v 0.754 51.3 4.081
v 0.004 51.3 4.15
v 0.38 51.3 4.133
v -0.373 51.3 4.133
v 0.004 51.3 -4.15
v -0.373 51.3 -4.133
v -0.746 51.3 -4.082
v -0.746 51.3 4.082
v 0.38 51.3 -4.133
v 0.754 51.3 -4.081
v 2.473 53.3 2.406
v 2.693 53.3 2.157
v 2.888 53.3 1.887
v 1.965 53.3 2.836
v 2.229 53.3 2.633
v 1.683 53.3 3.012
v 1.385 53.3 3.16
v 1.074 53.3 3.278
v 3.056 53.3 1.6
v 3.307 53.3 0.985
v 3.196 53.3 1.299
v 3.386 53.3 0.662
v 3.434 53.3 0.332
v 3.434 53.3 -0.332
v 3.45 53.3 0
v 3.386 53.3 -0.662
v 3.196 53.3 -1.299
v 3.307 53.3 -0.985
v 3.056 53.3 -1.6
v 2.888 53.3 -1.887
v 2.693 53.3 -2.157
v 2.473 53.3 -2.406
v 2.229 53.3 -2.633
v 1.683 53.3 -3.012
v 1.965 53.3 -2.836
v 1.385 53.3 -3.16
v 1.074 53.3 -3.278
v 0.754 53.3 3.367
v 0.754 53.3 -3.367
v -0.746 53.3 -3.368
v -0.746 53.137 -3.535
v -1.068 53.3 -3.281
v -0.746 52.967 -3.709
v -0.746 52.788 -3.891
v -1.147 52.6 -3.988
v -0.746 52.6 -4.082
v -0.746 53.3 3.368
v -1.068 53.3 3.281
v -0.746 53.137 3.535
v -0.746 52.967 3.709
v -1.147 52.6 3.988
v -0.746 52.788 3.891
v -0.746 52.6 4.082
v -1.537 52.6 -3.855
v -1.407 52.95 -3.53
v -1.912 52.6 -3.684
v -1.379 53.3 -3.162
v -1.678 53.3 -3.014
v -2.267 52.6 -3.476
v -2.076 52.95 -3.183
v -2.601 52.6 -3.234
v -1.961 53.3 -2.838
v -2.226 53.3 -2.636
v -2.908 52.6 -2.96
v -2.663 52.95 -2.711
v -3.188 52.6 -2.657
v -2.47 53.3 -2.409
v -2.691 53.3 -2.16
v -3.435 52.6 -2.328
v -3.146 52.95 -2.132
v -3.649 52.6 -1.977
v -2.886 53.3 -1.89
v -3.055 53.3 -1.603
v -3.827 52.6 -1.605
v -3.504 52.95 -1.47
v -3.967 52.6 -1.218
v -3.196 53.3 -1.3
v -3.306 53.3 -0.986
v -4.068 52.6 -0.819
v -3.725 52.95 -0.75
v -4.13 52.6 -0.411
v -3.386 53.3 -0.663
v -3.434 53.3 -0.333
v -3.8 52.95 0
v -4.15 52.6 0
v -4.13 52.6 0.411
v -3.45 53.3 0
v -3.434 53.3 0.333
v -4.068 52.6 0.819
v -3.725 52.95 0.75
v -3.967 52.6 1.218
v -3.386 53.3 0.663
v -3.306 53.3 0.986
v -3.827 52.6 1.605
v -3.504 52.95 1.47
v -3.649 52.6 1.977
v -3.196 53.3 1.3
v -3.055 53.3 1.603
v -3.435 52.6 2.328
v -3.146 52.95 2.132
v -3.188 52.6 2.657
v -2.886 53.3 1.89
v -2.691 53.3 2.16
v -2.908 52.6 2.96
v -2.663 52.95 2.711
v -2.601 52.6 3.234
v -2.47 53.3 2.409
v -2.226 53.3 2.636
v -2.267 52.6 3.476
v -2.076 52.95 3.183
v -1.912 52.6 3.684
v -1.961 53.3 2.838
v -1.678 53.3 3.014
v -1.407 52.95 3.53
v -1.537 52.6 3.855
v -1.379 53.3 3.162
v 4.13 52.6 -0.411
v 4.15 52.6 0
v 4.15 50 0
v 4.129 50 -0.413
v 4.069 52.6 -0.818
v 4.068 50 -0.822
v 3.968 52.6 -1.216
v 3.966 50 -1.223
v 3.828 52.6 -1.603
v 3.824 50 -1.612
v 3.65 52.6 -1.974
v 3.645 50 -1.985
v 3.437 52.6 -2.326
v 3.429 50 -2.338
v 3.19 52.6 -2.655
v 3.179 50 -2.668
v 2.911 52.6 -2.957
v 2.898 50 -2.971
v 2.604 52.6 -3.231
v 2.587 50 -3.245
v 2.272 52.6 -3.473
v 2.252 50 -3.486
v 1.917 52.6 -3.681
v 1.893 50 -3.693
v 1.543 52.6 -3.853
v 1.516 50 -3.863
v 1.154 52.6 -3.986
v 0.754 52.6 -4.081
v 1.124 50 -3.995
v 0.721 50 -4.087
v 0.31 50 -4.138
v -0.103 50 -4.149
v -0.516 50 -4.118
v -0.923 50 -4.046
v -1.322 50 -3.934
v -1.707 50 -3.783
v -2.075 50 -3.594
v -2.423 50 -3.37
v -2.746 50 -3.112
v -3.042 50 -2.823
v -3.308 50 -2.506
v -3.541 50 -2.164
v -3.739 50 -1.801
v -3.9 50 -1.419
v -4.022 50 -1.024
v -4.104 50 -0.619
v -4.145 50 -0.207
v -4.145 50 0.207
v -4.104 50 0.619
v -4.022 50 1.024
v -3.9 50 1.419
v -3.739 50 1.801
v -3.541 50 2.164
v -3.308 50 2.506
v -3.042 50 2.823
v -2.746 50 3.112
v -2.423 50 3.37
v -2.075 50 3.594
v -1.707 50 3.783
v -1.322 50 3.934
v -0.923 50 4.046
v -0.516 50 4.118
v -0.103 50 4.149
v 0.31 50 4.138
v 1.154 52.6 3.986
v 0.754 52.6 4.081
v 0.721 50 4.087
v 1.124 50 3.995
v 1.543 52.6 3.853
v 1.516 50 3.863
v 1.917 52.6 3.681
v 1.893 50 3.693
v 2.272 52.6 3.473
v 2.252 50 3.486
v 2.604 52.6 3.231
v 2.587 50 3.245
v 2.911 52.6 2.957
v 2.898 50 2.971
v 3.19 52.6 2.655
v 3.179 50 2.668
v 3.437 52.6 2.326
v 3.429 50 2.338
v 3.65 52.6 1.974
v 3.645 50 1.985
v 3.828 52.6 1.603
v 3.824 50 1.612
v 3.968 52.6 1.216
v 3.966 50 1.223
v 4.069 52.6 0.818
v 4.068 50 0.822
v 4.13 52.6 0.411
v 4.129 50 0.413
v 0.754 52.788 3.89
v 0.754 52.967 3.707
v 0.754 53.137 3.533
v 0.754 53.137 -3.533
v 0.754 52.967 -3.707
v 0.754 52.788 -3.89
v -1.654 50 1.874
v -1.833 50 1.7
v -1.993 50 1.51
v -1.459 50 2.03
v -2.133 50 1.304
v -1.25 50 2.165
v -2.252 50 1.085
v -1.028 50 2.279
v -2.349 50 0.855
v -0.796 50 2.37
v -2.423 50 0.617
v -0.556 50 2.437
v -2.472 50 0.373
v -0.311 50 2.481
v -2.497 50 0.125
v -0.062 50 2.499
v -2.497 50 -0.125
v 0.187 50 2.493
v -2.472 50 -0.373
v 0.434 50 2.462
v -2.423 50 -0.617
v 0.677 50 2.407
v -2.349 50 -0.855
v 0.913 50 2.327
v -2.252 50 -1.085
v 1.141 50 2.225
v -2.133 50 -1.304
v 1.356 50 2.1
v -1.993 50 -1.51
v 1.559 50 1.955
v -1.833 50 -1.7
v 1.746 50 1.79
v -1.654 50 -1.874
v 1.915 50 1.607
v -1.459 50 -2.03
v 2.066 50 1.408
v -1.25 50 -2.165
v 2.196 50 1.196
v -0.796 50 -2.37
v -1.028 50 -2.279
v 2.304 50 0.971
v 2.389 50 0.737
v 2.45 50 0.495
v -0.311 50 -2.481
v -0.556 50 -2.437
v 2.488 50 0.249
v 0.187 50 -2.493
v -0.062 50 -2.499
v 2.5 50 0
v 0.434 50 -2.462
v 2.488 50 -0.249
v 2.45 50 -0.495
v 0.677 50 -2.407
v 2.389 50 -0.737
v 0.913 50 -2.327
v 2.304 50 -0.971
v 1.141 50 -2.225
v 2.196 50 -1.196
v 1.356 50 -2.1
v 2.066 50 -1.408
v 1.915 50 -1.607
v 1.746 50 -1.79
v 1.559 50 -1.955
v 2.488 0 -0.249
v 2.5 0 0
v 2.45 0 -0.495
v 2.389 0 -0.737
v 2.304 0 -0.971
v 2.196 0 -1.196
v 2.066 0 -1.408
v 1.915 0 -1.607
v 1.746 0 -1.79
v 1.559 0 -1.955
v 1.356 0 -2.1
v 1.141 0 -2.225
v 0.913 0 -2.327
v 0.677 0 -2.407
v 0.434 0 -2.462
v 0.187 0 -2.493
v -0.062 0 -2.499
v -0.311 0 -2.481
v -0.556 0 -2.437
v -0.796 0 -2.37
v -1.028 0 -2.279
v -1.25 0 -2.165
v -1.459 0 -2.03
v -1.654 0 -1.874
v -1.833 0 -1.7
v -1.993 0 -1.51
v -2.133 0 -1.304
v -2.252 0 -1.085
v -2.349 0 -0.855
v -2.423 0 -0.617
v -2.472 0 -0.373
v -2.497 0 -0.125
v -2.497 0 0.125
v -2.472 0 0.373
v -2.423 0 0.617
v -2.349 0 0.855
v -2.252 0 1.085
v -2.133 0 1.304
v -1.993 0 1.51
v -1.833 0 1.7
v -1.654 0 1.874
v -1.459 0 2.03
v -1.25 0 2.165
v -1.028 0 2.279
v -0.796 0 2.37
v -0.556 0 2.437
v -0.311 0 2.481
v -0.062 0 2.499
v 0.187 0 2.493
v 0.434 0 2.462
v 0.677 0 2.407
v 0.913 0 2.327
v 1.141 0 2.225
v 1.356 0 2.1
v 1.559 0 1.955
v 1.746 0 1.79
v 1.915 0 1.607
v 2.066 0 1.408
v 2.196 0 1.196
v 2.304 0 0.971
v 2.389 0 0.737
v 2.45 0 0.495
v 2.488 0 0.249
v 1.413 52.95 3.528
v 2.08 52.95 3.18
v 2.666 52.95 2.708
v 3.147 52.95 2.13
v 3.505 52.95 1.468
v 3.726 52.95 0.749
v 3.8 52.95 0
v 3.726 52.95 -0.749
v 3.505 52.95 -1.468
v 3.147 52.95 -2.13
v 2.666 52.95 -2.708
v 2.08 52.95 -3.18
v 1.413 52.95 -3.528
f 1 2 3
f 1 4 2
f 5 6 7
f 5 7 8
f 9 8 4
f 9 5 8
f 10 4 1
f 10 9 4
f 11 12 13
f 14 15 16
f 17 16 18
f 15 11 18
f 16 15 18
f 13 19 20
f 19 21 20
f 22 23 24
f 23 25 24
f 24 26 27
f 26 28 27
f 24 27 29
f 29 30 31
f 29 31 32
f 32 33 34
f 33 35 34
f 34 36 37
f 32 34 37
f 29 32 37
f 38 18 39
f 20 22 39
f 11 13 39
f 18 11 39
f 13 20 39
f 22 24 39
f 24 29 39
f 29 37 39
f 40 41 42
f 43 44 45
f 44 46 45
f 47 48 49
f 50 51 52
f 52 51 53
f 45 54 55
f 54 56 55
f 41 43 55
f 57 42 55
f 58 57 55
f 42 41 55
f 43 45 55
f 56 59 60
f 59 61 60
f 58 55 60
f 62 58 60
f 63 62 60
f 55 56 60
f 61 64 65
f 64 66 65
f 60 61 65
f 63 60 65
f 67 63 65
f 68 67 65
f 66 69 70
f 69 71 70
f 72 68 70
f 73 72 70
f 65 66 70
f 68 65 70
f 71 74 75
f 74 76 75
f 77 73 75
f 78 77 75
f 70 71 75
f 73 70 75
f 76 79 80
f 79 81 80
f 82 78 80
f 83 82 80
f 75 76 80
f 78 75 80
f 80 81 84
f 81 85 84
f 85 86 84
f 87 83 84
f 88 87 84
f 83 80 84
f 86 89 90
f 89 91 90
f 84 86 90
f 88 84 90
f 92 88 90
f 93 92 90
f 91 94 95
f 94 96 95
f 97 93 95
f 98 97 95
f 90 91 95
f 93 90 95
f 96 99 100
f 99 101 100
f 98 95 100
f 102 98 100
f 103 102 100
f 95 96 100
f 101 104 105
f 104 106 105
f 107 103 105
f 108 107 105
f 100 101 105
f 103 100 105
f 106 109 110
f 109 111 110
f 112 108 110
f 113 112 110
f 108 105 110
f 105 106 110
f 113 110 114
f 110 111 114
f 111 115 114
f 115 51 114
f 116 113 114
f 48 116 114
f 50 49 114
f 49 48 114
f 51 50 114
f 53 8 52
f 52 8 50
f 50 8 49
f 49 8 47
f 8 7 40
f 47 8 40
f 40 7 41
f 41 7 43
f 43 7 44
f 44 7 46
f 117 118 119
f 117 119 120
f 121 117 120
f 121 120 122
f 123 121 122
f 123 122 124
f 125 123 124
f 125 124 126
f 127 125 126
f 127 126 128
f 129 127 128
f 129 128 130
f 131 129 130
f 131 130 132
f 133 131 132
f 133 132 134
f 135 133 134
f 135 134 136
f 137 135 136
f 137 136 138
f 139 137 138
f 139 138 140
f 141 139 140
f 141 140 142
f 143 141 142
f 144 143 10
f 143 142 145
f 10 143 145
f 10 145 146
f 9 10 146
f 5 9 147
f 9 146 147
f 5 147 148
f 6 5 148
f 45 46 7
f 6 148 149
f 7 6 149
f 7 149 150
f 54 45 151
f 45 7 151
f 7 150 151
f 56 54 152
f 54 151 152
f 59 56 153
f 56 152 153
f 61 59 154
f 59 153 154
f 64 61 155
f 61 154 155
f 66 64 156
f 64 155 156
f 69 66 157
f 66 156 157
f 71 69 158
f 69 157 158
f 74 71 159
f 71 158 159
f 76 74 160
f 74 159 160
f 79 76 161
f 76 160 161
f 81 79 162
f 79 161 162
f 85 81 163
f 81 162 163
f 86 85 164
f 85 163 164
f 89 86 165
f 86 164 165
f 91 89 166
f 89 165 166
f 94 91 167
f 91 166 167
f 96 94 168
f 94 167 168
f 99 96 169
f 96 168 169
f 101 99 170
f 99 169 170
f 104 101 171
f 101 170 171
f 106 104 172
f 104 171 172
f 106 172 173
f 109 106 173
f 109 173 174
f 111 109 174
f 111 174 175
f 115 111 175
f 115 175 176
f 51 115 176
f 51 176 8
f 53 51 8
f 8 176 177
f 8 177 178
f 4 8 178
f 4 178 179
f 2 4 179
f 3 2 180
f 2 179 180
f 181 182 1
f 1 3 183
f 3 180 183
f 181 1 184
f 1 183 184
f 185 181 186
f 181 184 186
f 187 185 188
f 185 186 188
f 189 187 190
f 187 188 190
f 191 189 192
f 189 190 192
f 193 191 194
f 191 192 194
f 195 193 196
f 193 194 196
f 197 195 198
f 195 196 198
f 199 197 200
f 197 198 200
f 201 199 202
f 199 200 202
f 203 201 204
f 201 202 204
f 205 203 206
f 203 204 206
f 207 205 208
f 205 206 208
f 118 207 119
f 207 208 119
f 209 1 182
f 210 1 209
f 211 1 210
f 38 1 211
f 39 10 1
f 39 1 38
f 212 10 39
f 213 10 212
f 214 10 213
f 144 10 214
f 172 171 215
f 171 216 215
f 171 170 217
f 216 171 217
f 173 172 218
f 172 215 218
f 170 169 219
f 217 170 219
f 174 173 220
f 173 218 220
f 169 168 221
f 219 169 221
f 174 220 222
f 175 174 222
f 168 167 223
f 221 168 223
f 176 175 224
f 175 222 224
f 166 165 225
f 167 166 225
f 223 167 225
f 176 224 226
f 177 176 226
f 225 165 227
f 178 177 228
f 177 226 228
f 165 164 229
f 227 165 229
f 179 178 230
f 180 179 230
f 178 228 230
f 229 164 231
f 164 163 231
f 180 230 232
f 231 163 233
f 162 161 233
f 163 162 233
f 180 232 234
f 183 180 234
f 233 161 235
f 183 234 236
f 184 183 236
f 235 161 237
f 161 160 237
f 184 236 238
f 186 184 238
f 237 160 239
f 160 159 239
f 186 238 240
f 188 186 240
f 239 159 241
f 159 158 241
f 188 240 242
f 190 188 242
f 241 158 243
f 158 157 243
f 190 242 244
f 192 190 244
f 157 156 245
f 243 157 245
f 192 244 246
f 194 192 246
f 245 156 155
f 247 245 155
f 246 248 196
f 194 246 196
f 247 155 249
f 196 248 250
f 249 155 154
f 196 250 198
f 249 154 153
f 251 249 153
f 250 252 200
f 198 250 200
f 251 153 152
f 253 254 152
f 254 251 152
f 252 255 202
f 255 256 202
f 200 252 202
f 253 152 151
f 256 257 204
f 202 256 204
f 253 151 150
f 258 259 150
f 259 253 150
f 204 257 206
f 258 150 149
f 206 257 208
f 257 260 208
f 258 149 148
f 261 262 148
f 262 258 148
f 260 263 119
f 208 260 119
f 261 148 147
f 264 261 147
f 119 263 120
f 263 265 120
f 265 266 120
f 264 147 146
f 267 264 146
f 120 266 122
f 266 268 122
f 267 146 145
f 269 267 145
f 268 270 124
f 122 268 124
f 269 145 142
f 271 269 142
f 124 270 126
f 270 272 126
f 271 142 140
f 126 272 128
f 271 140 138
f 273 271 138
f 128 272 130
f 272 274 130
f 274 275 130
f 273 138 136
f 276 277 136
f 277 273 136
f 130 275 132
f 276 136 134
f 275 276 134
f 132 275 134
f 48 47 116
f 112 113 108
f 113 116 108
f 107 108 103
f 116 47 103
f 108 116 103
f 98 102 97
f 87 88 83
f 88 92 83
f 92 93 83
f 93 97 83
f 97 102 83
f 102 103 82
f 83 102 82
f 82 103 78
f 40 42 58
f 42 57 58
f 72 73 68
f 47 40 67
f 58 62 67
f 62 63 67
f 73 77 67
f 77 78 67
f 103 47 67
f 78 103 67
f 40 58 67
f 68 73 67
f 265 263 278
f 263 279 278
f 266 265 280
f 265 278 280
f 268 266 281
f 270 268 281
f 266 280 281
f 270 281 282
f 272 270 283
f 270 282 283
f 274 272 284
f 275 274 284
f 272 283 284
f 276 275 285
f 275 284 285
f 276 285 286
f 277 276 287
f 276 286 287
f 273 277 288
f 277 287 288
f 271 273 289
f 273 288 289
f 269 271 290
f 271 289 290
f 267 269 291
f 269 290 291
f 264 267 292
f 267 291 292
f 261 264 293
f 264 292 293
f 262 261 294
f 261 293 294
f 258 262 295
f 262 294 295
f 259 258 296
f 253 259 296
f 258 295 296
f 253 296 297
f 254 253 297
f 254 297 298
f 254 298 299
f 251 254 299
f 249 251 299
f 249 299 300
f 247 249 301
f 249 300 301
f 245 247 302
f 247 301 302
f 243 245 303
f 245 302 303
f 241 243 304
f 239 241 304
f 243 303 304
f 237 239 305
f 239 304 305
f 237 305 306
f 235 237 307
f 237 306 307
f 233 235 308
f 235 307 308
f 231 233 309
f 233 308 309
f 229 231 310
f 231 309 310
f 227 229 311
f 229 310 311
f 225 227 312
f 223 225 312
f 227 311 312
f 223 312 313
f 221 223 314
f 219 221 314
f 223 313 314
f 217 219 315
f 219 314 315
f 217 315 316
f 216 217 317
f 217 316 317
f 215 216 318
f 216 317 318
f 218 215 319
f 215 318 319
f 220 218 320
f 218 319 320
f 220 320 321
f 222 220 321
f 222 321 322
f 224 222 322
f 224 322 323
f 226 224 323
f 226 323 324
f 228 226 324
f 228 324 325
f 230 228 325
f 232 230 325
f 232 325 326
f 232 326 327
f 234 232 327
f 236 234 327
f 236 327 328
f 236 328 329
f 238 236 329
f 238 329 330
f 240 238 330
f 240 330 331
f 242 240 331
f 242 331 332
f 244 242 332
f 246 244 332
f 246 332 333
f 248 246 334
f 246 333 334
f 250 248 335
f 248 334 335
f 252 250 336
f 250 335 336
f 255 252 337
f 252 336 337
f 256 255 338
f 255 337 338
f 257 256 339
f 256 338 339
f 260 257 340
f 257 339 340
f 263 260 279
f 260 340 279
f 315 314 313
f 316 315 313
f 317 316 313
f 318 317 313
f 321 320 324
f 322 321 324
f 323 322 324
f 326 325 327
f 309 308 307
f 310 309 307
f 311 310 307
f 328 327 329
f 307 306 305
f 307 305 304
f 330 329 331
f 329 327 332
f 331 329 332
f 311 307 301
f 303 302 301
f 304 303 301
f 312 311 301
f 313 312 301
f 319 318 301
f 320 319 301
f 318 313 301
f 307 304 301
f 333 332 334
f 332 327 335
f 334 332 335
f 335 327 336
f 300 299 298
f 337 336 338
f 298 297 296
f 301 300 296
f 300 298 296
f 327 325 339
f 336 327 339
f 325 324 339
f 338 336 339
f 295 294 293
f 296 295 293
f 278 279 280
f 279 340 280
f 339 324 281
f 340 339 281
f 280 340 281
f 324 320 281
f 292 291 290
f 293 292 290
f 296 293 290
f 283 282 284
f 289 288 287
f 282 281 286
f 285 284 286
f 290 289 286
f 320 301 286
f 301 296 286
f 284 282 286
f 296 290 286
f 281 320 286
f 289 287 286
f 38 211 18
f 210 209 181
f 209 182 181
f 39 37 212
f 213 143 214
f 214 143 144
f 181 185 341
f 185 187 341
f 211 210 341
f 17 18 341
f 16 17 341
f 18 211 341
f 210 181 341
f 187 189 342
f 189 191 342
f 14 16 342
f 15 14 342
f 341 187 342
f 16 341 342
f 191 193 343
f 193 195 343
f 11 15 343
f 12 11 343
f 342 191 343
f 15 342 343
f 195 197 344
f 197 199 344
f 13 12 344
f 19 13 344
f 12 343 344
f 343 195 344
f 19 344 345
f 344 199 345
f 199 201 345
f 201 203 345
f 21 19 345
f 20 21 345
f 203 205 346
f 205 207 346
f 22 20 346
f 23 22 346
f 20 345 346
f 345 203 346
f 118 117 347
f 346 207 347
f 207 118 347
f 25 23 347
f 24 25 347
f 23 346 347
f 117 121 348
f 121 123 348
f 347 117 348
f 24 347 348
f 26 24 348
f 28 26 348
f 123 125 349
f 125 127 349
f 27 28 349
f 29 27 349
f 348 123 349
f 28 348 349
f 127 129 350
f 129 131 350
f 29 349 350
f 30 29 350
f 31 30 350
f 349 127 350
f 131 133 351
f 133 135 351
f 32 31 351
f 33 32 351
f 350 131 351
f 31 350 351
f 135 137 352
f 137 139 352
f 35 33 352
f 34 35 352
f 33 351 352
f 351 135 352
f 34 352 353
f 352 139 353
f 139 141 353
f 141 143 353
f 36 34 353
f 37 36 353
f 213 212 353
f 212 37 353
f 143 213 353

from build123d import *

# Parameters (mm, degrees)
CHAMFER1_SIZE           = 0.7
SKETCH2_W               = 1.5
SKETCH2_H               = 6.7872108
CUT_EXTRUDE1_DEPTH      = 50
CUT_EXTRUDE1_DEPTH_BACK = 19


with BuildPart() as part:
    # Sketch1 → Revolve1 (revolve)
    with BuildSketch(Plane.XY):
        Polygon((0, 53.3), (4.15, 53.3), (4.15, 50), (2.5, 50), (2.5, 0), (0, 0), (0, 50), align=None)
    revolve(axis=Axis((0, 0, 0), (0, 1, 0)))

    # Chamfer1
    chamfer1_edges = [part.edges().sort_by_distance(p)[0] for p in [
        (-4.15, 53.3, 0),
    ]]
    chamfer(chamfer1_edges, length=CHAMFER1_SIZE)

    # Sketch2 → Cut-Extrude1 (cut, two sides)
    with BuildSketch(Plane.XY) as cut_extrude1_sk:
        with Locations((0.003512463, 54.6936054)):
            Rectangle(SKETCH2_W, SKETCH2_H)
    extrude(amount=CUT_EXTRUDE1_DEPTH, mode=Mode.SUBTRACT)
    extrude(cut_extrude1_sk.sketch, amount=-CUT_EXTRUDE1_DEPTH_BACK, mode=Mode.SUBTRACT)


solid = part.part
